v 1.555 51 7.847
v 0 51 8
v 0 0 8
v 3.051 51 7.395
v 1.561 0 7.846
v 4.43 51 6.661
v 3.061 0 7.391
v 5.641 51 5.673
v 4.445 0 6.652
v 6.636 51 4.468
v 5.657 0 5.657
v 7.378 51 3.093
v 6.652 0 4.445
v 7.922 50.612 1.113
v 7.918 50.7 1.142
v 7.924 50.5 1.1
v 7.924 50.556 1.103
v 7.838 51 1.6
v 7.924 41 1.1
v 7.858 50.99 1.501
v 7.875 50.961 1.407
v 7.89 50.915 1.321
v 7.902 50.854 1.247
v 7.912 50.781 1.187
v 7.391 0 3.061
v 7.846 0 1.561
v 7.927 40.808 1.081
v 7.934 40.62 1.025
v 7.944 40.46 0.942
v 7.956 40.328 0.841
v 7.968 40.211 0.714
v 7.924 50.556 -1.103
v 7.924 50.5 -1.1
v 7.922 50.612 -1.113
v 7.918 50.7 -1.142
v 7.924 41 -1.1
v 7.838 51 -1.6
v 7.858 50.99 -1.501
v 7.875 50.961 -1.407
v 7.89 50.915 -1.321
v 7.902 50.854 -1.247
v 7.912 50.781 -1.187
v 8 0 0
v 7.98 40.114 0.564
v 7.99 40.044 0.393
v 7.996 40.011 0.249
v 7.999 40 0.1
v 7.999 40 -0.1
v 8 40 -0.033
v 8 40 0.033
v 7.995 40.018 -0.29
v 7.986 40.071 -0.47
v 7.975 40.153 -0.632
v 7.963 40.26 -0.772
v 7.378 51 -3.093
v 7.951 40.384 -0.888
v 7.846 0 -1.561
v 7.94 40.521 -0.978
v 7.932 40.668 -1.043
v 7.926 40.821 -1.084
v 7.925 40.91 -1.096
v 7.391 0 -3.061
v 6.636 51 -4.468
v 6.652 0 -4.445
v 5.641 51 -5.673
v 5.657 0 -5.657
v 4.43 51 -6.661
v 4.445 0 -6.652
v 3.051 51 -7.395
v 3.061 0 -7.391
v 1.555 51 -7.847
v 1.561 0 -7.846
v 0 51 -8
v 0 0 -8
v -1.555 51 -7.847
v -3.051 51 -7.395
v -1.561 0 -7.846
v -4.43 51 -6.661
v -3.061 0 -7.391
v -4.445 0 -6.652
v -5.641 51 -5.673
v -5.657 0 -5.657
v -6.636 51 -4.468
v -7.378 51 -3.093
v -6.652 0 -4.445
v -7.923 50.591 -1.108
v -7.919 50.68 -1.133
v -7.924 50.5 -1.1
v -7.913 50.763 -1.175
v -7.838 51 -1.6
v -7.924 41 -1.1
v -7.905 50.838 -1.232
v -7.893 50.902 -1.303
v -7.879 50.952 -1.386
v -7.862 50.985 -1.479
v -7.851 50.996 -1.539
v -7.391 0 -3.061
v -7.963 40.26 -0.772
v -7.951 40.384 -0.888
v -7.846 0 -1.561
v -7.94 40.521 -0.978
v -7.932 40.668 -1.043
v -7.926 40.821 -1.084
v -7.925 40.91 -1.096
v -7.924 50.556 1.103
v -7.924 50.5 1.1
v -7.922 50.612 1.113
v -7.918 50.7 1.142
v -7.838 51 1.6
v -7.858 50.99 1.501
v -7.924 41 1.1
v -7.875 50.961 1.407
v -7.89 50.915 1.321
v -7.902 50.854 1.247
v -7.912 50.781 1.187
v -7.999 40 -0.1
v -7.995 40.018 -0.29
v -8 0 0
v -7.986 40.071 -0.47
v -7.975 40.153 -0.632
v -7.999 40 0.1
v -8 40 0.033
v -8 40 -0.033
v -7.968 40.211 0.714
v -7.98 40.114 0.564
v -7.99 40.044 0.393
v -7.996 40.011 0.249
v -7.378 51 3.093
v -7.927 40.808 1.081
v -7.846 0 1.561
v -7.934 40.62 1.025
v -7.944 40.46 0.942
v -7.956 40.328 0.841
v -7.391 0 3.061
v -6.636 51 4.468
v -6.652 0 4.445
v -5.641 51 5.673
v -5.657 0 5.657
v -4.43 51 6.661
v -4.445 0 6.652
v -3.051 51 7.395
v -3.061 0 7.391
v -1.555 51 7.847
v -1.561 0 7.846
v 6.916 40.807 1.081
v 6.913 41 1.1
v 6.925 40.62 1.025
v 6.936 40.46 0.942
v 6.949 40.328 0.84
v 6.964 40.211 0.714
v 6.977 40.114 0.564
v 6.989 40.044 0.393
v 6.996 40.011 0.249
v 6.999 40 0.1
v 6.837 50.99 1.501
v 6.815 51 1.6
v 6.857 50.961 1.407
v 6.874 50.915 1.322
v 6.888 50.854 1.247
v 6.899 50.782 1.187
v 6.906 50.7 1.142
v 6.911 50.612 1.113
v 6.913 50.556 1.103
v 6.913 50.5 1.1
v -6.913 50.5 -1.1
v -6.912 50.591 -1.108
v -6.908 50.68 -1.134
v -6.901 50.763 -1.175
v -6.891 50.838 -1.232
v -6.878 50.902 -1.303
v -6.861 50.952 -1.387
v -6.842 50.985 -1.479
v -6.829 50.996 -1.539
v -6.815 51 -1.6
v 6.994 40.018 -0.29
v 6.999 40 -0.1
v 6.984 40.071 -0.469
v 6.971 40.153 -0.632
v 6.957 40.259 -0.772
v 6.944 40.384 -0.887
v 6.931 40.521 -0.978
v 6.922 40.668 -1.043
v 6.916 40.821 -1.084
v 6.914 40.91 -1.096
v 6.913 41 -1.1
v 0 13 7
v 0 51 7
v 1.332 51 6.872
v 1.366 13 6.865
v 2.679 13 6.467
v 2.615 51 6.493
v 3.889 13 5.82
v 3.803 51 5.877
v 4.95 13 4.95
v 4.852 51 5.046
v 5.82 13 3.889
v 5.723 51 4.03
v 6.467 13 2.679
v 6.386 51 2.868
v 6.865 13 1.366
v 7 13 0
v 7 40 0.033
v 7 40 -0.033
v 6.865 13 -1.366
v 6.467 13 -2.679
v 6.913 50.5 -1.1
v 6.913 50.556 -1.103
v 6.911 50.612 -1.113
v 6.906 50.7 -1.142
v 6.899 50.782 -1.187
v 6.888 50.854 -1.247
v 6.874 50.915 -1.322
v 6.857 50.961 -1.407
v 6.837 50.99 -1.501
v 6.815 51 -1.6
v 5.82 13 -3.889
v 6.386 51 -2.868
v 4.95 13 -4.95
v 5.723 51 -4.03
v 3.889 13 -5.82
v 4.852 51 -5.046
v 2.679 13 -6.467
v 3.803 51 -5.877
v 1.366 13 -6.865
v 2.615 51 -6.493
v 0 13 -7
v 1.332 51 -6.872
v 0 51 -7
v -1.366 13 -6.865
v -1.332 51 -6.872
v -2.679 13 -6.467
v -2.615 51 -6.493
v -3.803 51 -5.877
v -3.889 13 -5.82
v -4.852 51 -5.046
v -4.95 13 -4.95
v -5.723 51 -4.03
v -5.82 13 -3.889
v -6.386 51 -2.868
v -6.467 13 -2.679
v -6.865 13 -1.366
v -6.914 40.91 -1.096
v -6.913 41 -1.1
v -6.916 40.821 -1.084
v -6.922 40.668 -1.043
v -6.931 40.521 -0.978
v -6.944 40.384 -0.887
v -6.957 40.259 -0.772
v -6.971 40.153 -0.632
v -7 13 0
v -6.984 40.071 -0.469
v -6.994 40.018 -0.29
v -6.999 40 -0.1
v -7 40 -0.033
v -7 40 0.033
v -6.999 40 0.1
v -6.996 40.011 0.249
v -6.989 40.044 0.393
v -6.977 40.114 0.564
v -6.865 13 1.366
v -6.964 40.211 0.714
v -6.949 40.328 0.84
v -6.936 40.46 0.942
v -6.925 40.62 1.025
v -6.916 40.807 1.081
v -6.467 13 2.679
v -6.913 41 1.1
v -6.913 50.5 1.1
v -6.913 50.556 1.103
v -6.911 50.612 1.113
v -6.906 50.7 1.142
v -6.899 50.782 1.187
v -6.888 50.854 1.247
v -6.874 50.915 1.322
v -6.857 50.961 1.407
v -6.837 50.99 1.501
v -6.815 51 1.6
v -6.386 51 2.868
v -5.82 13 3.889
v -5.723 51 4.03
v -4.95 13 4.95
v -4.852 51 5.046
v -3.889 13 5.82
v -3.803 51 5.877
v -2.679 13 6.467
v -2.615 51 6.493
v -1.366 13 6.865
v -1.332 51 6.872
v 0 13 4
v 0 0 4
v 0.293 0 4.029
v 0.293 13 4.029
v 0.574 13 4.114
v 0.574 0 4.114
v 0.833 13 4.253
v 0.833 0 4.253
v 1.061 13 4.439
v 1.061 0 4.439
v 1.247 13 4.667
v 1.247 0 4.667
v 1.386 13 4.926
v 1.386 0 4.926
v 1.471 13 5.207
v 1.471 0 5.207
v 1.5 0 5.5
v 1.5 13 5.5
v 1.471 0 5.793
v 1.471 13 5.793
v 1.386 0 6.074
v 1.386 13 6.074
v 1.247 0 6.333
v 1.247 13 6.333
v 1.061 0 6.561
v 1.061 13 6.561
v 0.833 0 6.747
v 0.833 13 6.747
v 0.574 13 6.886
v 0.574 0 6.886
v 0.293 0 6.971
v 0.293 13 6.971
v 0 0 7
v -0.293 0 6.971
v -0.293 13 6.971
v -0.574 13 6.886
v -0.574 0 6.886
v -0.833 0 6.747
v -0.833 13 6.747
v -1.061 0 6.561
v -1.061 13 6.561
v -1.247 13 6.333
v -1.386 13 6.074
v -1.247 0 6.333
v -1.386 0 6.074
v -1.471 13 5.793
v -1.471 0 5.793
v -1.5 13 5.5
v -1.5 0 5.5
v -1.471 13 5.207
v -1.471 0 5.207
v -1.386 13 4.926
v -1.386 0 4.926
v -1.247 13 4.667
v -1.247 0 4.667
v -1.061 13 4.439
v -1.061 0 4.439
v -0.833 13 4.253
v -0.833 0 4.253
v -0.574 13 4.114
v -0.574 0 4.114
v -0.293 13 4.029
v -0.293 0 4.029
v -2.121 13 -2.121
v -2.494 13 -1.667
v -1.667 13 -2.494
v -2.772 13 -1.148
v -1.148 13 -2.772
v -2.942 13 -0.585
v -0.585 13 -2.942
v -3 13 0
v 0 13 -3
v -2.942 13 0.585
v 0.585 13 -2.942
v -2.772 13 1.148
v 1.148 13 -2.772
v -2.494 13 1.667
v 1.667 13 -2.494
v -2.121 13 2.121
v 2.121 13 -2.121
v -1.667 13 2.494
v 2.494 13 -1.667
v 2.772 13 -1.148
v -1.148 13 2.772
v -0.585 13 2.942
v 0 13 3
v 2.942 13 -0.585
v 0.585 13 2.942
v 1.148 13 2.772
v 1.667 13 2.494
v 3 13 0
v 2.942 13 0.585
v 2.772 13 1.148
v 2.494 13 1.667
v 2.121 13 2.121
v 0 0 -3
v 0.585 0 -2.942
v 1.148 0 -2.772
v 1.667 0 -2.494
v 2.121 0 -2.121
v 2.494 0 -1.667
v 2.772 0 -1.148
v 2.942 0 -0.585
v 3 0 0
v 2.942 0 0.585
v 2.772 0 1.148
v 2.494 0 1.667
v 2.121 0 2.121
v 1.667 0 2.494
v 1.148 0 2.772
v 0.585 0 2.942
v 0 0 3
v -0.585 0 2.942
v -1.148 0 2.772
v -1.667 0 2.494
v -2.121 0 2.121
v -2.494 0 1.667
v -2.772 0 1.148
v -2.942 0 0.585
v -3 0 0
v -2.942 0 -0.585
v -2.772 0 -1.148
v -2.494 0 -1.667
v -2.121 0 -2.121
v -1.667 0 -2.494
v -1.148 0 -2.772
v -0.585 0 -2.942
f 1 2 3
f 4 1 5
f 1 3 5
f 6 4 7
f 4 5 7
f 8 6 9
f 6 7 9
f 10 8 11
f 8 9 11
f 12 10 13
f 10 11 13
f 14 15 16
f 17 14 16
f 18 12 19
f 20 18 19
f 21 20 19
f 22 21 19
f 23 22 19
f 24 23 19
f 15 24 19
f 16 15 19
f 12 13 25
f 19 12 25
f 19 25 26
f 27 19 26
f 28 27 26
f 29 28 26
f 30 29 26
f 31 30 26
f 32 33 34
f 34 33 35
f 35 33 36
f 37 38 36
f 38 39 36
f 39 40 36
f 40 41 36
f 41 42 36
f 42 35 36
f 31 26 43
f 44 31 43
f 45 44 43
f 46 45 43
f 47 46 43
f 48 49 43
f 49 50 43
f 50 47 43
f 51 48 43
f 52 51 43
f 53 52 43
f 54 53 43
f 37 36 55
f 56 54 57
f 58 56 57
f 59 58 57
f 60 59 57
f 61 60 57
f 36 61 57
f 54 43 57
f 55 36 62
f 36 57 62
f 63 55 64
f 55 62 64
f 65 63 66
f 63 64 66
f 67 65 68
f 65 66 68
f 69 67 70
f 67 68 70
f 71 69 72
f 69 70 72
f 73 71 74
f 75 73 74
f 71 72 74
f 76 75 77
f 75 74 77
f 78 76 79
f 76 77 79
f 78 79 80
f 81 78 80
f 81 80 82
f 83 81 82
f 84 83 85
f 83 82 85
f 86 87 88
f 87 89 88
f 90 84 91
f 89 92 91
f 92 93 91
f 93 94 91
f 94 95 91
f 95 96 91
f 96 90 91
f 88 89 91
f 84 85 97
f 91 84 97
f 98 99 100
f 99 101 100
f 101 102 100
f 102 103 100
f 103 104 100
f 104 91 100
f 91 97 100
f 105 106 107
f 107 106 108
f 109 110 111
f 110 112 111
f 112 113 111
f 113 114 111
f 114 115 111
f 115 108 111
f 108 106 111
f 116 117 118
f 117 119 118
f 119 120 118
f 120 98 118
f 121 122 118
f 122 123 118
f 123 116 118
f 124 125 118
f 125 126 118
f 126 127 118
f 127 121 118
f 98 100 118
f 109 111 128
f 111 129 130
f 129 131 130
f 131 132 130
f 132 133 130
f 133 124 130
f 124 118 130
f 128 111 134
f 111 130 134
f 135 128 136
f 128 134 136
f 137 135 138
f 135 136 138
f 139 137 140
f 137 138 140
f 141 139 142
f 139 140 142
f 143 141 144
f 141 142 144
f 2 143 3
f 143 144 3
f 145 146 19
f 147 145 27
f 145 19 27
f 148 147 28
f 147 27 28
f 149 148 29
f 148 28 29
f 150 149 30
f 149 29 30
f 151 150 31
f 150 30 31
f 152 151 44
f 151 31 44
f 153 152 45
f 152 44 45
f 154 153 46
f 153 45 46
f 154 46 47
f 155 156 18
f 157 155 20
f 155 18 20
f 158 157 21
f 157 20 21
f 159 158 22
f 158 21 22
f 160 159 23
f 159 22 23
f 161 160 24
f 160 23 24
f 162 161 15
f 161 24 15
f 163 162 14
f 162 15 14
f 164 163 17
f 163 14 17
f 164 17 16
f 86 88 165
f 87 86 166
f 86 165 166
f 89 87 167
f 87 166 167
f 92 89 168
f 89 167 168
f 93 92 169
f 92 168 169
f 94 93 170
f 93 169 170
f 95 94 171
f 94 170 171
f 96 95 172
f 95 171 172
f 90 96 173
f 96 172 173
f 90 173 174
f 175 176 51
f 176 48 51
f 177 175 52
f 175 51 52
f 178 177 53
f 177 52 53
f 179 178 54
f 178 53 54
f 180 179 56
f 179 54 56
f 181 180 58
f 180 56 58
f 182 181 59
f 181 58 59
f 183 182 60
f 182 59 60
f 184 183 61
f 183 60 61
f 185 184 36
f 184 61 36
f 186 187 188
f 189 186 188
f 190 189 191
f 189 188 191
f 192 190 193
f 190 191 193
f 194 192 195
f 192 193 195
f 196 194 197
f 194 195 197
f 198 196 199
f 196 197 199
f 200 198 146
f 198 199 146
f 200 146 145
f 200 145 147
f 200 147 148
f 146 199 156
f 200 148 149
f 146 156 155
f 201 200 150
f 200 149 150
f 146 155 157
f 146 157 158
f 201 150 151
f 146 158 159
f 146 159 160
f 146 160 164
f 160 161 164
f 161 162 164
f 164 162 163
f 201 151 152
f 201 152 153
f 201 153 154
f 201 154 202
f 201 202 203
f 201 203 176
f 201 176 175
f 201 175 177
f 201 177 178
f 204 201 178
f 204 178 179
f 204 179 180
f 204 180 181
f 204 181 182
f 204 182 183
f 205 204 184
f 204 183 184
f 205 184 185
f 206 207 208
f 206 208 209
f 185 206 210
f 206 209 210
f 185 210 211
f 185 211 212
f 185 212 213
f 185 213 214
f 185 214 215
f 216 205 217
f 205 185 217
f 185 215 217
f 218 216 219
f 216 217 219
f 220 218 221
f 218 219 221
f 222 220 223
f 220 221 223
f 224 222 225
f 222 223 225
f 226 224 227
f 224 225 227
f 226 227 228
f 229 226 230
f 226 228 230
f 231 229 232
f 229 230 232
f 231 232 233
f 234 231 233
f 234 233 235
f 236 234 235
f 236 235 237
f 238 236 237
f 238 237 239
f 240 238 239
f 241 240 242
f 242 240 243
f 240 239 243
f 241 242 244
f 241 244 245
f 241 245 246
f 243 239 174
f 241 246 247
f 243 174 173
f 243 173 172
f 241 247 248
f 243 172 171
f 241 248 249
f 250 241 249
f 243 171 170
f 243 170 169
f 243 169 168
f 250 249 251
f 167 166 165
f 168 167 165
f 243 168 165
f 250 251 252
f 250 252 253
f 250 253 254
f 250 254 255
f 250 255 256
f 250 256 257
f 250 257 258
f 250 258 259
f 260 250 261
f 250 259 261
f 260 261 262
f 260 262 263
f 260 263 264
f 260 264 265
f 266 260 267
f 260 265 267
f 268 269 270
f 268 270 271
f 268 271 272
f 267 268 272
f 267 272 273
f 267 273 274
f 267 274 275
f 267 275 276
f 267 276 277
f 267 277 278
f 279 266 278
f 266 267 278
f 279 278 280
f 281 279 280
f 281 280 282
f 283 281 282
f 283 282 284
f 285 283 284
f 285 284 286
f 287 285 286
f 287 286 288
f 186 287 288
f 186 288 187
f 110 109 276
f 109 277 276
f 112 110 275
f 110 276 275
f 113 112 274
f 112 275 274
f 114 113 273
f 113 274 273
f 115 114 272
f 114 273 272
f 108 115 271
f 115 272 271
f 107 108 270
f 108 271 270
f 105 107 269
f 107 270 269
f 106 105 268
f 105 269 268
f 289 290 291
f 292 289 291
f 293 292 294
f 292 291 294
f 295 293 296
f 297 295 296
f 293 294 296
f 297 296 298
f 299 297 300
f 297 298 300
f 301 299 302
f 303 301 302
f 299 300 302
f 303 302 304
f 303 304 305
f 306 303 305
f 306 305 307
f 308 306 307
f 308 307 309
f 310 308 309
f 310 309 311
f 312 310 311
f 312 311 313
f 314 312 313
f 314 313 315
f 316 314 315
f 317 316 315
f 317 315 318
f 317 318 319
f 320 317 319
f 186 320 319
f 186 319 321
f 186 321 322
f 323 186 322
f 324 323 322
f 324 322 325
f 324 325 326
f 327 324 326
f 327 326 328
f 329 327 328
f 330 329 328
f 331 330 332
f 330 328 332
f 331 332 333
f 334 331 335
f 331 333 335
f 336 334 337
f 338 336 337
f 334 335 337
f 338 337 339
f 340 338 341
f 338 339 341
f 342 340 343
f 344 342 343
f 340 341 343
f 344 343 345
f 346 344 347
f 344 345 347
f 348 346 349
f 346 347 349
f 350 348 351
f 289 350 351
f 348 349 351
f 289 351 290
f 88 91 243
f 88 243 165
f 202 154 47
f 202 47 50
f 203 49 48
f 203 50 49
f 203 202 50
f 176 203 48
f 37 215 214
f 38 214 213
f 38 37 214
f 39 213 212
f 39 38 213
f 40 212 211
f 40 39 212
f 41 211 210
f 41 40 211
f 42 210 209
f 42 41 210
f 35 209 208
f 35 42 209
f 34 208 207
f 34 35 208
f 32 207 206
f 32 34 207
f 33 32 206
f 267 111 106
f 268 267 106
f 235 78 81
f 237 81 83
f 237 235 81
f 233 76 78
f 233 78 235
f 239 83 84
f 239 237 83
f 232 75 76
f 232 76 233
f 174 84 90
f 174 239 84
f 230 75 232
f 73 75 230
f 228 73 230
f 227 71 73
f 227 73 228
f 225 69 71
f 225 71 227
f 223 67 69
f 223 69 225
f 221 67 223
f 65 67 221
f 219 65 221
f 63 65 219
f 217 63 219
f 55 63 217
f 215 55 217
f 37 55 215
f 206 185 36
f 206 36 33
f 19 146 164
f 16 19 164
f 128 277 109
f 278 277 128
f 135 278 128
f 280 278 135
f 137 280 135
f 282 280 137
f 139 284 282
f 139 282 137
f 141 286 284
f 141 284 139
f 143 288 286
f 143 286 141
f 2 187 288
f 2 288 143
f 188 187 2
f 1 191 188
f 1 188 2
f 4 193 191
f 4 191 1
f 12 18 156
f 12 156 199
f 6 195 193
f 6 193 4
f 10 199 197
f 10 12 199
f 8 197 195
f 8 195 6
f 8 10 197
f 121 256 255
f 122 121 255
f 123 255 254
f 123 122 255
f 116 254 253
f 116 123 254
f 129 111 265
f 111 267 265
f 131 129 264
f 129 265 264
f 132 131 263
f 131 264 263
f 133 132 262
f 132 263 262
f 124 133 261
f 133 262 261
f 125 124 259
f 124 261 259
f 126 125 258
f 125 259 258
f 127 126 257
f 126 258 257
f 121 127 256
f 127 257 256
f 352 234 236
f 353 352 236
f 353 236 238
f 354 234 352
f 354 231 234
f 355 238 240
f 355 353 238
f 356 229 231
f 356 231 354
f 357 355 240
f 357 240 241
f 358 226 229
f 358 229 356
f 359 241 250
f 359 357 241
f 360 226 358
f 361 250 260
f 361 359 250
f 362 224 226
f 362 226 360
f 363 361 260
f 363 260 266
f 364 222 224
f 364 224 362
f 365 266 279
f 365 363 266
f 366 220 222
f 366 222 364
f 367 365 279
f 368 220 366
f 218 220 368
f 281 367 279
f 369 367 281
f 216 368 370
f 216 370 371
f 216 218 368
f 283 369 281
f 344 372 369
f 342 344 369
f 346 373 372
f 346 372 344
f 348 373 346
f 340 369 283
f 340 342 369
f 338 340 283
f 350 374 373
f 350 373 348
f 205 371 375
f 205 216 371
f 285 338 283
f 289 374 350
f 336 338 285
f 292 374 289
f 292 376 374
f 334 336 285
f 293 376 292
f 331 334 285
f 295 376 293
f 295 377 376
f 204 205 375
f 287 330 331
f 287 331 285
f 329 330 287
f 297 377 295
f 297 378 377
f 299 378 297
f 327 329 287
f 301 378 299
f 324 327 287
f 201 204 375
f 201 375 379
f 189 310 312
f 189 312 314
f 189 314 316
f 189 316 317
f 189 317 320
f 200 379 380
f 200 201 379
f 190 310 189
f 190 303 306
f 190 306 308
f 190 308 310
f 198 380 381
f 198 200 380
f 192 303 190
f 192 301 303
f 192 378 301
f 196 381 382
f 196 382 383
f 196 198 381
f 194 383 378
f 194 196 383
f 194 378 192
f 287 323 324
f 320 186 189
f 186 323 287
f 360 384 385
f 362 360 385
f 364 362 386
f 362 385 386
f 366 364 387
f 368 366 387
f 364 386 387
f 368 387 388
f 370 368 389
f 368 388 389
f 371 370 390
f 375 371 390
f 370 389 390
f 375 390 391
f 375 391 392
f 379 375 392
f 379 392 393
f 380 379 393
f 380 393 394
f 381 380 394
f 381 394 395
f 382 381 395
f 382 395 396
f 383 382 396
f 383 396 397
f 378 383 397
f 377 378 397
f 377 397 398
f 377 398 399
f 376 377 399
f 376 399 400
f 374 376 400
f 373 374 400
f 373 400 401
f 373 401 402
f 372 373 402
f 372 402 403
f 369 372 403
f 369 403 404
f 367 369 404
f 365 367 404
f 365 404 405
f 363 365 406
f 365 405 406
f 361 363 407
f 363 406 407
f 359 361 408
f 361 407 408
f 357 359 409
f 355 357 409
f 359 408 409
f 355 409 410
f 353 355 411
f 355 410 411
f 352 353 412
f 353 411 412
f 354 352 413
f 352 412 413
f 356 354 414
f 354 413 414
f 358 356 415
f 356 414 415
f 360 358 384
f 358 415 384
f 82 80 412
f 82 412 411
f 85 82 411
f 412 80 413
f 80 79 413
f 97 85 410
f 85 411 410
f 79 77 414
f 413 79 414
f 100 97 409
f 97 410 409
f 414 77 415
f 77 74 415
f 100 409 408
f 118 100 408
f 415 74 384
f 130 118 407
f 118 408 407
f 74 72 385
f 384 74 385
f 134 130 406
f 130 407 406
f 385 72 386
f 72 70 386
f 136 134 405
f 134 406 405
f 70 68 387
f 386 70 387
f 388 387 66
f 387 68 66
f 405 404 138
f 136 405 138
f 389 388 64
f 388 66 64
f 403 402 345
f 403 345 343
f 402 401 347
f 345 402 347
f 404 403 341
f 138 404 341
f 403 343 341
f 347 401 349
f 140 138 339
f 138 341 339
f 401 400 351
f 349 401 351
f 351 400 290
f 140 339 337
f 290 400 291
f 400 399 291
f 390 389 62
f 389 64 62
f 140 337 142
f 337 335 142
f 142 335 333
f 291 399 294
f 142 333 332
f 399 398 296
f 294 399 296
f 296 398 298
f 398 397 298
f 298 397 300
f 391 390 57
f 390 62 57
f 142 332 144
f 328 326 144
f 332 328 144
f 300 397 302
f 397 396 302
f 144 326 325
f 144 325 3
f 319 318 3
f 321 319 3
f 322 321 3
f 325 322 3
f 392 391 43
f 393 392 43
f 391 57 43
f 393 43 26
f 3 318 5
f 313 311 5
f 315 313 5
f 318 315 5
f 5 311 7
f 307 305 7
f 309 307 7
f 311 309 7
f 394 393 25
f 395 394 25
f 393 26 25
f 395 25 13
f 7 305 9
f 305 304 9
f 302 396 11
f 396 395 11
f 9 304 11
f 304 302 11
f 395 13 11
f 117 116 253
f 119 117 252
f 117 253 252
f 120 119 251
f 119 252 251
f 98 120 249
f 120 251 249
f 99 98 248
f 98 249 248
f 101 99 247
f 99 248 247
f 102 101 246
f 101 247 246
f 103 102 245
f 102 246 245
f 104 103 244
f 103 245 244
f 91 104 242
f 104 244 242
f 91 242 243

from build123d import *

# Parameters (mm, degrees)
SKETCH_1_R               = 8
EXTRUDE_1_DEPTH          = 51
SKETCH_2_R               = 7
CUT_EXTRUDE_1_DEPTH      = 38
CUT_EXTRUDE_2_DEPTH      = 53.239831546
CUT_EXTRUDE_2_DEPTH_BACK = 53.239831546
SKETCH_3_W               = 2.2
SKETCH_3_H               = 22
FILLET_1_R               = 0.5
FILLET_2_R               = 1
SKETCH_4_R               = 3
CUT_EXTRUDE_3_DEPTH      = 53.239831675
SKETCH_5_R               = 1.5
CUT_EXTRUDE_8_DEPTH      = 38


with BuildPart() as part:
    # 草图1 → 凸台-拉伸1 (new body)
    with BuildSketch(Plane(origin=(0, 0, 0), x_dir=(1, 0, 0), z_dir=(0, 1, 0))):
        with Locations(Location((0, 0, 0), (0, 0, 270))):
            Circle(SKETCH_1_R)
    extrude(amount=EXTRUDE_1_DEPTH)

    # 草图2 → 切除-拉伸1 (cut)
    with BuildSketch(Plane(origin=(0, 51, 0), x_dir=(1, 0, 0), z_dir=(0, 1, 0))):
        with Locations(Location((0, 0, 0), (0, 0, 270))):
            Circle(SKETCH_2_R)
    extrude(amount=-CUT_EXTRUDE_1_DEPTH, mode=Mode.SUBTRACT)

    # 草图3 → 切除-拉伸2 (cut, two sides: drawn at the far end of the back side and taken through both)
    with BuildSketch(Plane(origin=(0, 0, 0), x_dir=(0, 0, -1), z_dir=(1, 0, 0)).offset(-CUT_EXTRUDE_2_DEPTH_BACK)):
        with Locations((0, 51)):
            Rectangle(SKETCH_3_W, SKETCH_3_H)
    extrude(amount=CUT_EXTRUDE_2_DEPTH + CUT_EXTRUDE_2_DEPTH_BACK, mode=Mode.SUBTRACT)

    # 圆角1
    fillet_1_edges = [part.edges().sort_by_distance(p)[0] for p in [
        (7.418522654, 51, -1.1),
        (-7.418522654, 51, -1.1),
        (-7.418522654, 51, 1.1),
        (7.418522654, 51, 1.1),
    ]]
    fillet(fillet_1_edges, radius=FILLET_1_R)

    # 圆角2
    fillet_2_edges = [part.edges().sort_by_distance(p)[0] for p in [
        (7.418522654, 40, -1.1),
        (-7.418522654, 40, -1.1),
        (7.418522654, 40, 1.1),
        (-7.418522654, 40, 1.1),
    ]]
    fillet(fillet_2_edges, radius=FILLET_2_R)

    # 草图4 → 切除-拉伸3 (cut, through all)
    with BuildSketch(Plane(origin=(0, 0, 0), x_dir=(-1, 0, 0), z_dir=(0, -1, 0))):
        with Locations(Location((0, 0, 0), (0, 0, 90))):
            Circle(SKETCH_4_R)
    extrude(amount=-CUT_EXTRUDE_3_DEPTH, mode=Mode.SUBTRACT)

    # 草图5 → 切除-拉伸8 (cut)
    with BuildSketch(Plane.XZ):
        with Locations(Location((0, 5.5, 0), (0, 0, 270))):
            Circle(SKETCH_5_R)
    extrude(amount=-CUT_EXTRUDE_8_DEPTH, mode=Mode.SUBTRACT)


solid = part.part
